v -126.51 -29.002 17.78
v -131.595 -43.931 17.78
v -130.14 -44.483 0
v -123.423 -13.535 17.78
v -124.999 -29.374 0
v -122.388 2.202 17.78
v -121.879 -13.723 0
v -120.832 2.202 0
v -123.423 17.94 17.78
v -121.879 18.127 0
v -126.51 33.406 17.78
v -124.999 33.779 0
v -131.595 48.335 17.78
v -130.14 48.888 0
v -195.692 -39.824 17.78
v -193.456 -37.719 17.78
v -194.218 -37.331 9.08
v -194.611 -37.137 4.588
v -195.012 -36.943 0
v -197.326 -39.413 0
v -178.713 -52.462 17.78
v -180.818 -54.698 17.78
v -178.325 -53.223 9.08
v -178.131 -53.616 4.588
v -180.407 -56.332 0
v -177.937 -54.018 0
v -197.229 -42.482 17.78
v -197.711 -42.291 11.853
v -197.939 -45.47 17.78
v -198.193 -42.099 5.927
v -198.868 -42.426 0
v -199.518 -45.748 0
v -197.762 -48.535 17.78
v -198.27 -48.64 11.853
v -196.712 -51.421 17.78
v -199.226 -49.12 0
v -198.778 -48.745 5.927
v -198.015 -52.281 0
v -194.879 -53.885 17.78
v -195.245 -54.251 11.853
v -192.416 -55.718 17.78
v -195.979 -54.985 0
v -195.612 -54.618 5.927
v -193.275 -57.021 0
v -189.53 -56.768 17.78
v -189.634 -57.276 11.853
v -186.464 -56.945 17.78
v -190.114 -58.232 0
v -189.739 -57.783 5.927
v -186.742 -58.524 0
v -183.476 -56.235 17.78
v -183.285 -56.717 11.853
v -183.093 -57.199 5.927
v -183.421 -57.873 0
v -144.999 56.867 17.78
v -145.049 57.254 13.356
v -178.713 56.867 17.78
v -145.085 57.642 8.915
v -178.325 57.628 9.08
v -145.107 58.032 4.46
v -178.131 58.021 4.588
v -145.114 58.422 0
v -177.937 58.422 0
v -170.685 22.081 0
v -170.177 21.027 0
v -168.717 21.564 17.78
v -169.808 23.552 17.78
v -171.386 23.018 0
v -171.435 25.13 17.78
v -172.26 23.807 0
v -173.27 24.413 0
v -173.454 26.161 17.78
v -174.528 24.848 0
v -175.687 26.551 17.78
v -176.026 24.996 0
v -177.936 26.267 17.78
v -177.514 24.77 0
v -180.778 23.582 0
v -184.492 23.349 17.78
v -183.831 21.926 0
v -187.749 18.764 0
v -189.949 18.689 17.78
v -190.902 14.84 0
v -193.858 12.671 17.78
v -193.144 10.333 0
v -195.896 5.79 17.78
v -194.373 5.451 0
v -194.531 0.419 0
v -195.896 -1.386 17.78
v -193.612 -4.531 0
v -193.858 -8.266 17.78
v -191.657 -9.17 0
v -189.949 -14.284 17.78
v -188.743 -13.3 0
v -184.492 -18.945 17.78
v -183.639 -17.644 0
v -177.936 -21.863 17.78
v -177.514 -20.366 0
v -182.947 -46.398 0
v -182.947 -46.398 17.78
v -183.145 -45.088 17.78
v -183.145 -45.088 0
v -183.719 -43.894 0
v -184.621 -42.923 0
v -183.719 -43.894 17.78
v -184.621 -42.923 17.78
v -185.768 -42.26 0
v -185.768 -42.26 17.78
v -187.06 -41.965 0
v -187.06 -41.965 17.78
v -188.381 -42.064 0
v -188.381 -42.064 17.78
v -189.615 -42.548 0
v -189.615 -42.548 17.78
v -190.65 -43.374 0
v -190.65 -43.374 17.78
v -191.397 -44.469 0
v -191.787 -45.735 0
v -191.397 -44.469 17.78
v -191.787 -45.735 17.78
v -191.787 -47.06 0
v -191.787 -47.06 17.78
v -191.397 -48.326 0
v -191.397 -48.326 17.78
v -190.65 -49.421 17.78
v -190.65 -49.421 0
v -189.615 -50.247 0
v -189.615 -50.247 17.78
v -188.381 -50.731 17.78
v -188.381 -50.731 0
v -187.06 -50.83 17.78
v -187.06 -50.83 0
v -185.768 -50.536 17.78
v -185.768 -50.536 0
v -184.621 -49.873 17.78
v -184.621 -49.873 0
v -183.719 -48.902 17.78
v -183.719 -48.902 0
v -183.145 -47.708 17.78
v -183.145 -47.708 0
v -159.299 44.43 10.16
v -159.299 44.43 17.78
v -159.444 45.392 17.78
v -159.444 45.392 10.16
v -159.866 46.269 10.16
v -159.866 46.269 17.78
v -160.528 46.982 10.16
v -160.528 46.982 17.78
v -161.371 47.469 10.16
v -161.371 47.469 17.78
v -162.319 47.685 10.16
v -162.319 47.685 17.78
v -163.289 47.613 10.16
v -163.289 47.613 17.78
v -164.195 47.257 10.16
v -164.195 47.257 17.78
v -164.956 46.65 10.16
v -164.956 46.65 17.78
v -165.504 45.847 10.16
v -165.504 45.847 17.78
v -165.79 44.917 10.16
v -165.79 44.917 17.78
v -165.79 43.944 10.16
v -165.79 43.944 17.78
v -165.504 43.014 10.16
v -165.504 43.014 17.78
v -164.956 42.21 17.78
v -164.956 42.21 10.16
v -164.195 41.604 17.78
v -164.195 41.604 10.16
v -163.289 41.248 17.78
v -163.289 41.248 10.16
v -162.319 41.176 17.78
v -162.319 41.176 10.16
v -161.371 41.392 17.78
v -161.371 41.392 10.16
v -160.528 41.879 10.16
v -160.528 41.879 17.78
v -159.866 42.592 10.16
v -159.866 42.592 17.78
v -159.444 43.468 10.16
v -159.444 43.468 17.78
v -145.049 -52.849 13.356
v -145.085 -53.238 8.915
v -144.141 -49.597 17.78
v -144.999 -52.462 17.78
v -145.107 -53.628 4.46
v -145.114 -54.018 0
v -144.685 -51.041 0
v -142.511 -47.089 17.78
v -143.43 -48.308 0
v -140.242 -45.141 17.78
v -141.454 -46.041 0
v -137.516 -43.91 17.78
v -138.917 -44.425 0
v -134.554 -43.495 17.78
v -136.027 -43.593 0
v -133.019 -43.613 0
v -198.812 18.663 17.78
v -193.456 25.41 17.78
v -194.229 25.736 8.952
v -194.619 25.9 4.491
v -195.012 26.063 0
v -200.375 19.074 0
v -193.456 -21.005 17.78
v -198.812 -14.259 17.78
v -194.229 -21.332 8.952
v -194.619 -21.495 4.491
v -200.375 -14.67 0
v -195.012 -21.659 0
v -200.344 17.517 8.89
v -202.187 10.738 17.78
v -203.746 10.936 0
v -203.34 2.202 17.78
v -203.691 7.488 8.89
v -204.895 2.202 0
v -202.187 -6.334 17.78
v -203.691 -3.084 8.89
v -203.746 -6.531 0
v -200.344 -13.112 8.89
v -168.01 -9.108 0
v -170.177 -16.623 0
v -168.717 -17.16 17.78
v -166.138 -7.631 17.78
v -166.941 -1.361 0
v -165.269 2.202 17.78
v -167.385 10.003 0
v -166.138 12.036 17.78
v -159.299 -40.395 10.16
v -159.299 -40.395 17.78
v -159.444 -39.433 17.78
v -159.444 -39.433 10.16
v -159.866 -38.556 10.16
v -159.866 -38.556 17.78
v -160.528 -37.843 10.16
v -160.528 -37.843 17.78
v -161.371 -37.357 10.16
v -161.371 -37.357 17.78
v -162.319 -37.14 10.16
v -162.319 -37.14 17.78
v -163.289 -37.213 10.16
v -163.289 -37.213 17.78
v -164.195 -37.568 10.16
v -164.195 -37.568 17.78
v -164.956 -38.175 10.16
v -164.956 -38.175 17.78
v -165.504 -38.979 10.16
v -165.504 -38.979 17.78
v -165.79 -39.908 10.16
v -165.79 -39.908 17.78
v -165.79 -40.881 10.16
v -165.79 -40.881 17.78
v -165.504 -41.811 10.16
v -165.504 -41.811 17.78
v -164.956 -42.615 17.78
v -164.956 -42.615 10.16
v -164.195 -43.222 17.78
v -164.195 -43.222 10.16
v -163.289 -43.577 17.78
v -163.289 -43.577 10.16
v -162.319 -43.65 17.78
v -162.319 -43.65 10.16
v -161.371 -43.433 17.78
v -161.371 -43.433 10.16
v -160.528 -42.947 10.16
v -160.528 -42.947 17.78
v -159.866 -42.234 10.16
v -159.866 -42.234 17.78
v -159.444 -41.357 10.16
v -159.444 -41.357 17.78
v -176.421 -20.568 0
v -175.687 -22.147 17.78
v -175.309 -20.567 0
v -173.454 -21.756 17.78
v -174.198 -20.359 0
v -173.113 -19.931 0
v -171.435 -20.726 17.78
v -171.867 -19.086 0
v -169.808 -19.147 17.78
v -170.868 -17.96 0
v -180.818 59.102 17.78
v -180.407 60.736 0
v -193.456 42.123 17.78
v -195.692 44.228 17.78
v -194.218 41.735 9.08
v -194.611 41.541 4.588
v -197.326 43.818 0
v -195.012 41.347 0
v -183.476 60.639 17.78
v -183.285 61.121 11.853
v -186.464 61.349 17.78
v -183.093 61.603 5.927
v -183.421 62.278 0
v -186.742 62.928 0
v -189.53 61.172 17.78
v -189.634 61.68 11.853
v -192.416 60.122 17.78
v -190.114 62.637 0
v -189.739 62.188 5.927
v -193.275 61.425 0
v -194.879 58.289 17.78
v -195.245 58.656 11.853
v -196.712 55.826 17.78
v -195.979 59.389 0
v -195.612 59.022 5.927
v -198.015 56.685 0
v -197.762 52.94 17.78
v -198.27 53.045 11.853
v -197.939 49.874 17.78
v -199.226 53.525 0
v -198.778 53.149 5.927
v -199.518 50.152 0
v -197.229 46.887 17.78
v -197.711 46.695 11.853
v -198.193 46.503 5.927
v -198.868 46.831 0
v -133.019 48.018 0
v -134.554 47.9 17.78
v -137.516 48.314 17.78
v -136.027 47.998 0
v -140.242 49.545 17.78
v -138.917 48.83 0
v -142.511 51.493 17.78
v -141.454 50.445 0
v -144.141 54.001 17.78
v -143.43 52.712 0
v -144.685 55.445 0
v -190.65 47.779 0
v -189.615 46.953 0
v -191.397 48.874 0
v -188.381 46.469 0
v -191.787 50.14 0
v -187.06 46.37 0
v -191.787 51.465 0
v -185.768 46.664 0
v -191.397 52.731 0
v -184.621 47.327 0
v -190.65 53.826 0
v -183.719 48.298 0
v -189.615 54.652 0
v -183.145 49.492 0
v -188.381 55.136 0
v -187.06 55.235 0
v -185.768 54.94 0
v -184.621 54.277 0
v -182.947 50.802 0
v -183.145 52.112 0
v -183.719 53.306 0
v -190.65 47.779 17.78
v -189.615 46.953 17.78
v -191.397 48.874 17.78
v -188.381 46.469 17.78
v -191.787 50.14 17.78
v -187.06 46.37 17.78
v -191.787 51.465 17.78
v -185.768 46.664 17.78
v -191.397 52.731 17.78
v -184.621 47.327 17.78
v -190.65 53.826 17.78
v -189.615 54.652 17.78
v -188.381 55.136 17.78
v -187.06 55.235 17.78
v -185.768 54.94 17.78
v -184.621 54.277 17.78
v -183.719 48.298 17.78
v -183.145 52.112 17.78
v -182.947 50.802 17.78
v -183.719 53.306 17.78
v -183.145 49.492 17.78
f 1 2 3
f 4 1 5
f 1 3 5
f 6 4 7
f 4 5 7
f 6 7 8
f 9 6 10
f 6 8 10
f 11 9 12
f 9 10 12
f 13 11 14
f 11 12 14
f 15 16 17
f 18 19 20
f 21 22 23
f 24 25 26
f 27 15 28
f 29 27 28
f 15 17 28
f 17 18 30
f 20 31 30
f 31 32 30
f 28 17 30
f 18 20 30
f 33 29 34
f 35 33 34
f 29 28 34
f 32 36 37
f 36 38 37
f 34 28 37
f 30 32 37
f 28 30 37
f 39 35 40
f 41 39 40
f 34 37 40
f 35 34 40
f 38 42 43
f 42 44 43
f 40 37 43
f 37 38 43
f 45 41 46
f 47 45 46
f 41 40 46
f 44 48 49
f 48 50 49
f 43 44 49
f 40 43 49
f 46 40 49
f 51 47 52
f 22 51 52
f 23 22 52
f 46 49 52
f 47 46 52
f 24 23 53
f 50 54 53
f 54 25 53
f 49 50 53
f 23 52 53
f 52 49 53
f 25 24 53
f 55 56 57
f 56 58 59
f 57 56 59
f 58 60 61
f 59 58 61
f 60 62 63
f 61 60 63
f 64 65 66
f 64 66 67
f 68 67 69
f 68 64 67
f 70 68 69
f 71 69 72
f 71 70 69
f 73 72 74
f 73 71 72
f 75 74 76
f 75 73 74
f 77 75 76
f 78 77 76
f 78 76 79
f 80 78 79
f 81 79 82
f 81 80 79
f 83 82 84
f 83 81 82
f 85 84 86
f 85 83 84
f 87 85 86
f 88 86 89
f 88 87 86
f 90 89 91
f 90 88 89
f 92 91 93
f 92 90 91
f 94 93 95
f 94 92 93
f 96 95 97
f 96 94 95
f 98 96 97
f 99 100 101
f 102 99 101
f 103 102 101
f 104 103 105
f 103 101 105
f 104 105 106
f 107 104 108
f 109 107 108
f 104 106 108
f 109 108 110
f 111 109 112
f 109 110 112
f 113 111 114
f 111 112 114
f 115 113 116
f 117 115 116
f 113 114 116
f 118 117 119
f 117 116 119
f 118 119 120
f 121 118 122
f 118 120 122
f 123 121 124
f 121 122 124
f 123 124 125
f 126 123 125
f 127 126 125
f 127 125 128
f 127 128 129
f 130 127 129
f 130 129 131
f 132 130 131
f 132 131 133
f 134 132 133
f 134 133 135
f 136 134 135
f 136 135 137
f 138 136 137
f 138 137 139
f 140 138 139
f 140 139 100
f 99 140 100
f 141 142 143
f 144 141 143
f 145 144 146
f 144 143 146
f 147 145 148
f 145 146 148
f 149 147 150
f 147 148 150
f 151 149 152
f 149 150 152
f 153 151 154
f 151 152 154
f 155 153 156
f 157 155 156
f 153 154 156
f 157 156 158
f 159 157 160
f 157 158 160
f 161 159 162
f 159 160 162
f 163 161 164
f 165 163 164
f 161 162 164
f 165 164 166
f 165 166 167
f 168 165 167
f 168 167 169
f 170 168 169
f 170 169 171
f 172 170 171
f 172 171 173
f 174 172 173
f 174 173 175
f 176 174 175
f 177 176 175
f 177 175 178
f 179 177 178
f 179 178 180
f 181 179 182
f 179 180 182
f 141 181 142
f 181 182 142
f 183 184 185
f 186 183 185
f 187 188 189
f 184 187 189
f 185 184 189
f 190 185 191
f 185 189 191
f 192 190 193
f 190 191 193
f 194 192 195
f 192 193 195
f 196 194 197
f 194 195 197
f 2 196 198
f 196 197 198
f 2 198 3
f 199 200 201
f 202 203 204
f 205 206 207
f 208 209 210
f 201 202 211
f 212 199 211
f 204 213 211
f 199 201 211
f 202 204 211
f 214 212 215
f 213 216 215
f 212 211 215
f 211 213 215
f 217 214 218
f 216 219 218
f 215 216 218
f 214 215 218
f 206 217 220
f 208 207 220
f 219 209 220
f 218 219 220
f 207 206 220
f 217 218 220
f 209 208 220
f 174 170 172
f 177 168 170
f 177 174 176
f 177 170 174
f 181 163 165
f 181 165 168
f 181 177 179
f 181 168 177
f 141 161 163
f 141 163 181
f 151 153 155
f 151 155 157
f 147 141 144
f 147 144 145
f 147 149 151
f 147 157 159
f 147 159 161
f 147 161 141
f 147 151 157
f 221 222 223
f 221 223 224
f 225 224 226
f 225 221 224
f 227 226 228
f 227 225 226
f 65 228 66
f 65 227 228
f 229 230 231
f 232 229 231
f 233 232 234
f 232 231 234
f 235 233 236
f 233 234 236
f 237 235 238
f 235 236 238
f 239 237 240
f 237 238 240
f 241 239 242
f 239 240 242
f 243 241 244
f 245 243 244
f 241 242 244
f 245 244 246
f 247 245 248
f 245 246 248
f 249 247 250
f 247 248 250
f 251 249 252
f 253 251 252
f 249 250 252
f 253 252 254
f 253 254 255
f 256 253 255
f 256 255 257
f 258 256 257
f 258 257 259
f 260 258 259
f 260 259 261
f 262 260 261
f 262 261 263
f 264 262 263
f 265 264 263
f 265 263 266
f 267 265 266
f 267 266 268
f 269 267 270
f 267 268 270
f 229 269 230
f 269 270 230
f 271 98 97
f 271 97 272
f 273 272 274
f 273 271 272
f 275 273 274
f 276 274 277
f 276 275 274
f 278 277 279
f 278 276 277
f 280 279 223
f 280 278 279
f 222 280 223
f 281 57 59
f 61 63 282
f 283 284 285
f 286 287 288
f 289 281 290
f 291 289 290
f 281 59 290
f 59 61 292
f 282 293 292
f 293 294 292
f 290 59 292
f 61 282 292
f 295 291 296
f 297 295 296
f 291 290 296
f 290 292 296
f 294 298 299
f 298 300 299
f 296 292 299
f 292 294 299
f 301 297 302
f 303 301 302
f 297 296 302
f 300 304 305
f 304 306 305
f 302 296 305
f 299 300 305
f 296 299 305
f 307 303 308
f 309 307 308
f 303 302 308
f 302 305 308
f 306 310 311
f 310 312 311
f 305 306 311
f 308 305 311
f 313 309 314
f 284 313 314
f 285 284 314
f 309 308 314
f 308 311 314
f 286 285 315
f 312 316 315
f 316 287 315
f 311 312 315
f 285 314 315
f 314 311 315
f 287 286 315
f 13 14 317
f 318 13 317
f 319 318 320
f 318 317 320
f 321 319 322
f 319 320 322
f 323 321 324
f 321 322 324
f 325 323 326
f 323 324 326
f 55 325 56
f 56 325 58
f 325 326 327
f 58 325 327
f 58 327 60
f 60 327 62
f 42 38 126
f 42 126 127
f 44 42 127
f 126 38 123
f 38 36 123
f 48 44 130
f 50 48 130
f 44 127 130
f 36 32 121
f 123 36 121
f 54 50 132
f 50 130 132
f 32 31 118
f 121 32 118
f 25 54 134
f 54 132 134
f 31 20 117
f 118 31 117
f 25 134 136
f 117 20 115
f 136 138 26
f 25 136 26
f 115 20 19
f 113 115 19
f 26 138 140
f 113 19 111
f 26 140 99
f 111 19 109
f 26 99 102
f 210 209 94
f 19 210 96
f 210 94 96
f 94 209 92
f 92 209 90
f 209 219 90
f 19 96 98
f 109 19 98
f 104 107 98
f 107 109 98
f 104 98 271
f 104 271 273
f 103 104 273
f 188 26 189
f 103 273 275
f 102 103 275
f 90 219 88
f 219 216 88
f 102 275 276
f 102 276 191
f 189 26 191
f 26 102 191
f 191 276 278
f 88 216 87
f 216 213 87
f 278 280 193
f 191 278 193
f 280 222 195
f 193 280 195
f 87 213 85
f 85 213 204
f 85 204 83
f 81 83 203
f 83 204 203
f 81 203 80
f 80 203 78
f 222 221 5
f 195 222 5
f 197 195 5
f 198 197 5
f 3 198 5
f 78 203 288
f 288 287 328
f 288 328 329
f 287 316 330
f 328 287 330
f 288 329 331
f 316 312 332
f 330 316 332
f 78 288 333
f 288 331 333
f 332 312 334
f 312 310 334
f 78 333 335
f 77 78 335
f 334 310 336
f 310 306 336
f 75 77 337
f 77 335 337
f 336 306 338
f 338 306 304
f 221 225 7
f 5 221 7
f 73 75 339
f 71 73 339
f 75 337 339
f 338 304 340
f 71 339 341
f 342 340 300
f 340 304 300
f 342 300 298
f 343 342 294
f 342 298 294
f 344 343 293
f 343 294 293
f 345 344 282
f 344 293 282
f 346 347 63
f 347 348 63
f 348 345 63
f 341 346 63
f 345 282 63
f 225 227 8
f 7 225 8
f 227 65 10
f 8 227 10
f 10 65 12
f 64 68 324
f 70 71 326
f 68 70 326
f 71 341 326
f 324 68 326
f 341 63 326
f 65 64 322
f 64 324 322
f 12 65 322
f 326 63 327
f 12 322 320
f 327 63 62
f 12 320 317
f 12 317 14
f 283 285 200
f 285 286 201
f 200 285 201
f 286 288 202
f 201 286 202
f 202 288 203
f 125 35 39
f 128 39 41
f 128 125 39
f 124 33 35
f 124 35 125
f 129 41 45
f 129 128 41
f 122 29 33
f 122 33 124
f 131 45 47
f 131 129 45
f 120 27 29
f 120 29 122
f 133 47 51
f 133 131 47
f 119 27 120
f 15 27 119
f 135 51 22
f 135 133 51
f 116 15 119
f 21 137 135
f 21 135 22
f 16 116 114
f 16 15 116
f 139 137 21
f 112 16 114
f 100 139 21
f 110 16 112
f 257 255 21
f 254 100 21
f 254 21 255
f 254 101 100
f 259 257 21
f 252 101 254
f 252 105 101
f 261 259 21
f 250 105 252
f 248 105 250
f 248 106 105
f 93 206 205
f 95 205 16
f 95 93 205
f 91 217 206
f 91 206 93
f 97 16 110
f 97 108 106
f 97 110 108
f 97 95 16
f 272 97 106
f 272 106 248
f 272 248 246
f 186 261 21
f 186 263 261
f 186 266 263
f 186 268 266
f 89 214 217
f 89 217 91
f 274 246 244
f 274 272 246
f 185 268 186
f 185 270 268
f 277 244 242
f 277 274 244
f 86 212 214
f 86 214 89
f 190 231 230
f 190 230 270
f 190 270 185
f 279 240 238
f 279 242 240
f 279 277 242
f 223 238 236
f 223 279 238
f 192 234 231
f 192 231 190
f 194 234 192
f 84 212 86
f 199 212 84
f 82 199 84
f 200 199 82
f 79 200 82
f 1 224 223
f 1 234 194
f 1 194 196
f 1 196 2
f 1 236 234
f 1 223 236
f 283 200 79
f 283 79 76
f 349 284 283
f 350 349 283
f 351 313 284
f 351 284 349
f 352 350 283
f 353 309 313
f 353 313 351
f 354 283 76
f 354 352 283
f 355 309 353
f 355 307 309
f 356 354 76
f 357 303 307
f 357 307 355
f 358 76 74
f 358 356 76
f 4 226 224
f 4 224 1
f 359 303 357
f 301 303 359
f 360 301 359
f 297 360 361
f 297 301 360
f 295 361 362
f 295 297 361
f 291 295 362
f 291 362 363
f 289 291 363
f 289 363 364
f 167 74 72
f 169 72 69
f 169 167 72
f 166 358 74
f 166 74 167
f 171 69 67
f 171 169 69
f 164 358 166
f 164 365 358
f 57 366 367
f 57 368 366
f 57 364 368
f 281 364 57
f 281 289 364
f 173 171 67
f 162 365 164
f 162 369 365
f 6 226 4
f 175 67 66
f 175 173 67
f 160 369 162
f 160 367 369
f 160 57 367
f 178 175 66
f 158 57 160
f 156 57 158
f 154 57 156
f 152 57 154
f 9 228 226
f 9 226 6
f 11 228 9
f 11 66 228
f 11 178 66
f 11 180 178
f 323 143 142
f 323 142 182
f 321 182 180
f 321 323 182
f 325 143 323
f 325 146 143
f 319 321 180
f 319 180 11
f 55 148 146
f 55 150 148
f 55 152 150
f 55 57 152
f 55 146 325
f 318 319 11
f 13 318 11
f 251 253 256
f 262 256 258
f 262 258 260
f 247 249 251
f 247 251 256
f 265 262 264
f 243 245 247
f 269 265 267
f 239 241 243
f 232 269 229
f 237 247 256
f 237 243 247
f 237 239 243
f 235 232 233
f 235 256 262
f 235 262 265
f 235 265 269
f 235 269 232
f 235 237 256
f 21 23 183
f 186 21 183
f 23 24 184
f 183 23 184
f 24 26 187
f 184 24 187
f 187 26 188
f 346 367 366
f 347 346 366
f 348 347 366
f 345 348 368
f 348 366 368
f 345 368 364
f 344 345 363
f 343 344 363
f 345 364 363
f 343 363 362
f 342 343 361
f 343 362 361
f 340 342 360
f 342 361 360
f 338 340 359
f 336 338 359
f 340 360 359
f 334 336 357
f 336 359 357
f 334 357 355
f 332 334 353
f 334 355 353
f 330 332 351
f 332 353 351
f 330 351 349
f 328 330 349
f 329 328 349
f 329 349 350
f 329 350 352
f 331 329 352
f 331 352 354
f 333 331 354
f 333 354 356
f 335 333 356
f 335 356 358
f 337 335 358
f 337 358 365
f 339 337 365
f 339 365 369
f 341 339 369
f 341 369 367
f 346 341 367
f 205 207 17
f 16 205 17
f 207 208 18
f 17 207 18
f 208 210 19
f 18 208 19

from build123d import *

# Parameters (mm, degrees)
EXTRUDE1_DEPTH     = 17.78
EXTRUDE1_DRAFT     = 5
SKETCH3_R          = 4.445
CUT_EXTRUDE2_DEPTH = 18.78
CUT_EXTRUDE3_DEPTH = 18.78
CUT_EXTRUDE3_TAPER = 5
SKETCH5_R          = 10.522638874
CUT_EXTRUDE4_DEPTH = 26.162
SKETCH6_R          = 3.2639
CUT_EXTRUDE5_DEPTH = 7.62


with BuildPart() as part:
    # Sketch1 → Extrude1 (with draft: the straight prism first)
    with BuildSketch(Plane.XY):
        with BuildLine():
            ThreePointArc((-195.012025381, 26.062859944), (-204.895443331, 2.202178287), (-195.012025381, -21.658503371))
            Line((-195.012025381, -21.658503371), (-195.012025381, -36.94271364))
            ThreePointArc((-195.012025381, -36.94271364), (-195.978739559, -54.984528068), (-177.936925131, -54.017813891))
            Line((-177.936925131, -54.017813891), (-134.591688961, -54.017813891))
            ThreePointArc((-134.591688961, -54.017813891), (-120.832429722, 2.202178287), (-134.591688961, 58.422170464))
            Line((-134.591688961, 58.422170464), (-177.936925131, 58.422170464))
            ThreePointArc((-177.936925131, 58.422170464), (-195.978739559, 59.388884642), (-195.012025381, 41.347070214))
            Line((-195.012025381, 41.347070214), (-195.012025381, 26.062859944))
        make_face()
    extrude(amount=EXTRUDE1_DEPTH)
    # Extrude1: the draft: its side faces are tilted about the plane it starts from
    extrude1_sides = [part.faces().sort_by_distance(p)[0] for p in [
        (-204.895443331, 2.202178287, 8.89),
        (-195.012025381, -29.300608506, 8.89),
        (-195.978739559, -54.984528068, 8.89),
        (-156.264307046, -54.017813891, 8.89),
        (-120.832429722, 2.202178287, 8.89),
        (-156.264307046, 58.422170464, 8.89),
        (-195.978739559, 59.388884642, 8.89),
        (-195.012025381, 33.704965079, 8.89),
    ]]
    draft(extrude1_sides, Plane.XY, EXTRUDE1_DRAFT)

    # Sketch3 → Cut-Extrude2 (cut, through all)
    with BuildSketch(Plane(origin=(10.378673568, 21.507111235, 17.78), x_dir=(1, 0, 0), z_dir=(0, 0, 1))):
        with Locations((-197.770698949, 29.295059229)):
            Circle(SKETCH3_R)
        with Locations((-197.770698949, -67.904925126)):
            Circle(SKETCH3_R)
    extrude(amount=-CUT_EXTRUDE2_DEPTH, mode=Mode.SUBTRACT)

    # Sketch4 → Cut-Extrude3 (cut, through all)
    with BuildSketch(Plane.XY.offset(17.78)):
        with BuildLine():
            ThreePointArc((-177.936489958, 26.267275972), (-196.154686221, 2.202178287), (-177.936489958, -21.862919399))
            ThreePointArc((-177.936489958, -21.862919399), (-172.405947357, -21.316646023), (-168.71726973, -17.159847564))
            ThreePointArc((-168.71726973, -17.159847564), (-165.268623085, 2.202178287), (-168.71726973, 21.564204137))
            ThreePointArc((-168.71726973, 21.564204137), (-172.405947357, 25.721002597), (-177.936489958, 26.267275972))
        make_face()
    extrude(amount=-CUT_EXTRUDE3_DEPTH, taper=CUT_EXTRUDE3_TAPER, mode=Mode.SUBTRACT)

    # Sketch5 → Cut-Extrude4 (cut)
    with BuildSketch(Plane(origin=(0, 0, 0), x_dir=(-1, 0, 0), z_dir=(0, 0, -1))):
        with Locations((134.591688961, 58.422170464)):
            Circle(SKETCH5_R)
        with Locations((134.591688961, -54.017813891)):
            Circle(SKETCH5_R)
    extrude(amount=-CUT_EXTRUDE4_DEPTH, mode=Mode.SUBTRACT)

    # Sketch6 → Cut-Extrude5 (cut)
    with BuildSketch(Plane.XY.offset(17.78)):
        with Locations((-162.563054604, 44.430433633)):
            Circle(SKETCH6_R)
        with Locations((-162.563054604, -40.394882783)):
            Circle(SKETCH6_R)
    extrude(amount=-CUT_EXTRUDE5_DEPTH, mode=Mode.SUBTRACT)


solid = part.part
